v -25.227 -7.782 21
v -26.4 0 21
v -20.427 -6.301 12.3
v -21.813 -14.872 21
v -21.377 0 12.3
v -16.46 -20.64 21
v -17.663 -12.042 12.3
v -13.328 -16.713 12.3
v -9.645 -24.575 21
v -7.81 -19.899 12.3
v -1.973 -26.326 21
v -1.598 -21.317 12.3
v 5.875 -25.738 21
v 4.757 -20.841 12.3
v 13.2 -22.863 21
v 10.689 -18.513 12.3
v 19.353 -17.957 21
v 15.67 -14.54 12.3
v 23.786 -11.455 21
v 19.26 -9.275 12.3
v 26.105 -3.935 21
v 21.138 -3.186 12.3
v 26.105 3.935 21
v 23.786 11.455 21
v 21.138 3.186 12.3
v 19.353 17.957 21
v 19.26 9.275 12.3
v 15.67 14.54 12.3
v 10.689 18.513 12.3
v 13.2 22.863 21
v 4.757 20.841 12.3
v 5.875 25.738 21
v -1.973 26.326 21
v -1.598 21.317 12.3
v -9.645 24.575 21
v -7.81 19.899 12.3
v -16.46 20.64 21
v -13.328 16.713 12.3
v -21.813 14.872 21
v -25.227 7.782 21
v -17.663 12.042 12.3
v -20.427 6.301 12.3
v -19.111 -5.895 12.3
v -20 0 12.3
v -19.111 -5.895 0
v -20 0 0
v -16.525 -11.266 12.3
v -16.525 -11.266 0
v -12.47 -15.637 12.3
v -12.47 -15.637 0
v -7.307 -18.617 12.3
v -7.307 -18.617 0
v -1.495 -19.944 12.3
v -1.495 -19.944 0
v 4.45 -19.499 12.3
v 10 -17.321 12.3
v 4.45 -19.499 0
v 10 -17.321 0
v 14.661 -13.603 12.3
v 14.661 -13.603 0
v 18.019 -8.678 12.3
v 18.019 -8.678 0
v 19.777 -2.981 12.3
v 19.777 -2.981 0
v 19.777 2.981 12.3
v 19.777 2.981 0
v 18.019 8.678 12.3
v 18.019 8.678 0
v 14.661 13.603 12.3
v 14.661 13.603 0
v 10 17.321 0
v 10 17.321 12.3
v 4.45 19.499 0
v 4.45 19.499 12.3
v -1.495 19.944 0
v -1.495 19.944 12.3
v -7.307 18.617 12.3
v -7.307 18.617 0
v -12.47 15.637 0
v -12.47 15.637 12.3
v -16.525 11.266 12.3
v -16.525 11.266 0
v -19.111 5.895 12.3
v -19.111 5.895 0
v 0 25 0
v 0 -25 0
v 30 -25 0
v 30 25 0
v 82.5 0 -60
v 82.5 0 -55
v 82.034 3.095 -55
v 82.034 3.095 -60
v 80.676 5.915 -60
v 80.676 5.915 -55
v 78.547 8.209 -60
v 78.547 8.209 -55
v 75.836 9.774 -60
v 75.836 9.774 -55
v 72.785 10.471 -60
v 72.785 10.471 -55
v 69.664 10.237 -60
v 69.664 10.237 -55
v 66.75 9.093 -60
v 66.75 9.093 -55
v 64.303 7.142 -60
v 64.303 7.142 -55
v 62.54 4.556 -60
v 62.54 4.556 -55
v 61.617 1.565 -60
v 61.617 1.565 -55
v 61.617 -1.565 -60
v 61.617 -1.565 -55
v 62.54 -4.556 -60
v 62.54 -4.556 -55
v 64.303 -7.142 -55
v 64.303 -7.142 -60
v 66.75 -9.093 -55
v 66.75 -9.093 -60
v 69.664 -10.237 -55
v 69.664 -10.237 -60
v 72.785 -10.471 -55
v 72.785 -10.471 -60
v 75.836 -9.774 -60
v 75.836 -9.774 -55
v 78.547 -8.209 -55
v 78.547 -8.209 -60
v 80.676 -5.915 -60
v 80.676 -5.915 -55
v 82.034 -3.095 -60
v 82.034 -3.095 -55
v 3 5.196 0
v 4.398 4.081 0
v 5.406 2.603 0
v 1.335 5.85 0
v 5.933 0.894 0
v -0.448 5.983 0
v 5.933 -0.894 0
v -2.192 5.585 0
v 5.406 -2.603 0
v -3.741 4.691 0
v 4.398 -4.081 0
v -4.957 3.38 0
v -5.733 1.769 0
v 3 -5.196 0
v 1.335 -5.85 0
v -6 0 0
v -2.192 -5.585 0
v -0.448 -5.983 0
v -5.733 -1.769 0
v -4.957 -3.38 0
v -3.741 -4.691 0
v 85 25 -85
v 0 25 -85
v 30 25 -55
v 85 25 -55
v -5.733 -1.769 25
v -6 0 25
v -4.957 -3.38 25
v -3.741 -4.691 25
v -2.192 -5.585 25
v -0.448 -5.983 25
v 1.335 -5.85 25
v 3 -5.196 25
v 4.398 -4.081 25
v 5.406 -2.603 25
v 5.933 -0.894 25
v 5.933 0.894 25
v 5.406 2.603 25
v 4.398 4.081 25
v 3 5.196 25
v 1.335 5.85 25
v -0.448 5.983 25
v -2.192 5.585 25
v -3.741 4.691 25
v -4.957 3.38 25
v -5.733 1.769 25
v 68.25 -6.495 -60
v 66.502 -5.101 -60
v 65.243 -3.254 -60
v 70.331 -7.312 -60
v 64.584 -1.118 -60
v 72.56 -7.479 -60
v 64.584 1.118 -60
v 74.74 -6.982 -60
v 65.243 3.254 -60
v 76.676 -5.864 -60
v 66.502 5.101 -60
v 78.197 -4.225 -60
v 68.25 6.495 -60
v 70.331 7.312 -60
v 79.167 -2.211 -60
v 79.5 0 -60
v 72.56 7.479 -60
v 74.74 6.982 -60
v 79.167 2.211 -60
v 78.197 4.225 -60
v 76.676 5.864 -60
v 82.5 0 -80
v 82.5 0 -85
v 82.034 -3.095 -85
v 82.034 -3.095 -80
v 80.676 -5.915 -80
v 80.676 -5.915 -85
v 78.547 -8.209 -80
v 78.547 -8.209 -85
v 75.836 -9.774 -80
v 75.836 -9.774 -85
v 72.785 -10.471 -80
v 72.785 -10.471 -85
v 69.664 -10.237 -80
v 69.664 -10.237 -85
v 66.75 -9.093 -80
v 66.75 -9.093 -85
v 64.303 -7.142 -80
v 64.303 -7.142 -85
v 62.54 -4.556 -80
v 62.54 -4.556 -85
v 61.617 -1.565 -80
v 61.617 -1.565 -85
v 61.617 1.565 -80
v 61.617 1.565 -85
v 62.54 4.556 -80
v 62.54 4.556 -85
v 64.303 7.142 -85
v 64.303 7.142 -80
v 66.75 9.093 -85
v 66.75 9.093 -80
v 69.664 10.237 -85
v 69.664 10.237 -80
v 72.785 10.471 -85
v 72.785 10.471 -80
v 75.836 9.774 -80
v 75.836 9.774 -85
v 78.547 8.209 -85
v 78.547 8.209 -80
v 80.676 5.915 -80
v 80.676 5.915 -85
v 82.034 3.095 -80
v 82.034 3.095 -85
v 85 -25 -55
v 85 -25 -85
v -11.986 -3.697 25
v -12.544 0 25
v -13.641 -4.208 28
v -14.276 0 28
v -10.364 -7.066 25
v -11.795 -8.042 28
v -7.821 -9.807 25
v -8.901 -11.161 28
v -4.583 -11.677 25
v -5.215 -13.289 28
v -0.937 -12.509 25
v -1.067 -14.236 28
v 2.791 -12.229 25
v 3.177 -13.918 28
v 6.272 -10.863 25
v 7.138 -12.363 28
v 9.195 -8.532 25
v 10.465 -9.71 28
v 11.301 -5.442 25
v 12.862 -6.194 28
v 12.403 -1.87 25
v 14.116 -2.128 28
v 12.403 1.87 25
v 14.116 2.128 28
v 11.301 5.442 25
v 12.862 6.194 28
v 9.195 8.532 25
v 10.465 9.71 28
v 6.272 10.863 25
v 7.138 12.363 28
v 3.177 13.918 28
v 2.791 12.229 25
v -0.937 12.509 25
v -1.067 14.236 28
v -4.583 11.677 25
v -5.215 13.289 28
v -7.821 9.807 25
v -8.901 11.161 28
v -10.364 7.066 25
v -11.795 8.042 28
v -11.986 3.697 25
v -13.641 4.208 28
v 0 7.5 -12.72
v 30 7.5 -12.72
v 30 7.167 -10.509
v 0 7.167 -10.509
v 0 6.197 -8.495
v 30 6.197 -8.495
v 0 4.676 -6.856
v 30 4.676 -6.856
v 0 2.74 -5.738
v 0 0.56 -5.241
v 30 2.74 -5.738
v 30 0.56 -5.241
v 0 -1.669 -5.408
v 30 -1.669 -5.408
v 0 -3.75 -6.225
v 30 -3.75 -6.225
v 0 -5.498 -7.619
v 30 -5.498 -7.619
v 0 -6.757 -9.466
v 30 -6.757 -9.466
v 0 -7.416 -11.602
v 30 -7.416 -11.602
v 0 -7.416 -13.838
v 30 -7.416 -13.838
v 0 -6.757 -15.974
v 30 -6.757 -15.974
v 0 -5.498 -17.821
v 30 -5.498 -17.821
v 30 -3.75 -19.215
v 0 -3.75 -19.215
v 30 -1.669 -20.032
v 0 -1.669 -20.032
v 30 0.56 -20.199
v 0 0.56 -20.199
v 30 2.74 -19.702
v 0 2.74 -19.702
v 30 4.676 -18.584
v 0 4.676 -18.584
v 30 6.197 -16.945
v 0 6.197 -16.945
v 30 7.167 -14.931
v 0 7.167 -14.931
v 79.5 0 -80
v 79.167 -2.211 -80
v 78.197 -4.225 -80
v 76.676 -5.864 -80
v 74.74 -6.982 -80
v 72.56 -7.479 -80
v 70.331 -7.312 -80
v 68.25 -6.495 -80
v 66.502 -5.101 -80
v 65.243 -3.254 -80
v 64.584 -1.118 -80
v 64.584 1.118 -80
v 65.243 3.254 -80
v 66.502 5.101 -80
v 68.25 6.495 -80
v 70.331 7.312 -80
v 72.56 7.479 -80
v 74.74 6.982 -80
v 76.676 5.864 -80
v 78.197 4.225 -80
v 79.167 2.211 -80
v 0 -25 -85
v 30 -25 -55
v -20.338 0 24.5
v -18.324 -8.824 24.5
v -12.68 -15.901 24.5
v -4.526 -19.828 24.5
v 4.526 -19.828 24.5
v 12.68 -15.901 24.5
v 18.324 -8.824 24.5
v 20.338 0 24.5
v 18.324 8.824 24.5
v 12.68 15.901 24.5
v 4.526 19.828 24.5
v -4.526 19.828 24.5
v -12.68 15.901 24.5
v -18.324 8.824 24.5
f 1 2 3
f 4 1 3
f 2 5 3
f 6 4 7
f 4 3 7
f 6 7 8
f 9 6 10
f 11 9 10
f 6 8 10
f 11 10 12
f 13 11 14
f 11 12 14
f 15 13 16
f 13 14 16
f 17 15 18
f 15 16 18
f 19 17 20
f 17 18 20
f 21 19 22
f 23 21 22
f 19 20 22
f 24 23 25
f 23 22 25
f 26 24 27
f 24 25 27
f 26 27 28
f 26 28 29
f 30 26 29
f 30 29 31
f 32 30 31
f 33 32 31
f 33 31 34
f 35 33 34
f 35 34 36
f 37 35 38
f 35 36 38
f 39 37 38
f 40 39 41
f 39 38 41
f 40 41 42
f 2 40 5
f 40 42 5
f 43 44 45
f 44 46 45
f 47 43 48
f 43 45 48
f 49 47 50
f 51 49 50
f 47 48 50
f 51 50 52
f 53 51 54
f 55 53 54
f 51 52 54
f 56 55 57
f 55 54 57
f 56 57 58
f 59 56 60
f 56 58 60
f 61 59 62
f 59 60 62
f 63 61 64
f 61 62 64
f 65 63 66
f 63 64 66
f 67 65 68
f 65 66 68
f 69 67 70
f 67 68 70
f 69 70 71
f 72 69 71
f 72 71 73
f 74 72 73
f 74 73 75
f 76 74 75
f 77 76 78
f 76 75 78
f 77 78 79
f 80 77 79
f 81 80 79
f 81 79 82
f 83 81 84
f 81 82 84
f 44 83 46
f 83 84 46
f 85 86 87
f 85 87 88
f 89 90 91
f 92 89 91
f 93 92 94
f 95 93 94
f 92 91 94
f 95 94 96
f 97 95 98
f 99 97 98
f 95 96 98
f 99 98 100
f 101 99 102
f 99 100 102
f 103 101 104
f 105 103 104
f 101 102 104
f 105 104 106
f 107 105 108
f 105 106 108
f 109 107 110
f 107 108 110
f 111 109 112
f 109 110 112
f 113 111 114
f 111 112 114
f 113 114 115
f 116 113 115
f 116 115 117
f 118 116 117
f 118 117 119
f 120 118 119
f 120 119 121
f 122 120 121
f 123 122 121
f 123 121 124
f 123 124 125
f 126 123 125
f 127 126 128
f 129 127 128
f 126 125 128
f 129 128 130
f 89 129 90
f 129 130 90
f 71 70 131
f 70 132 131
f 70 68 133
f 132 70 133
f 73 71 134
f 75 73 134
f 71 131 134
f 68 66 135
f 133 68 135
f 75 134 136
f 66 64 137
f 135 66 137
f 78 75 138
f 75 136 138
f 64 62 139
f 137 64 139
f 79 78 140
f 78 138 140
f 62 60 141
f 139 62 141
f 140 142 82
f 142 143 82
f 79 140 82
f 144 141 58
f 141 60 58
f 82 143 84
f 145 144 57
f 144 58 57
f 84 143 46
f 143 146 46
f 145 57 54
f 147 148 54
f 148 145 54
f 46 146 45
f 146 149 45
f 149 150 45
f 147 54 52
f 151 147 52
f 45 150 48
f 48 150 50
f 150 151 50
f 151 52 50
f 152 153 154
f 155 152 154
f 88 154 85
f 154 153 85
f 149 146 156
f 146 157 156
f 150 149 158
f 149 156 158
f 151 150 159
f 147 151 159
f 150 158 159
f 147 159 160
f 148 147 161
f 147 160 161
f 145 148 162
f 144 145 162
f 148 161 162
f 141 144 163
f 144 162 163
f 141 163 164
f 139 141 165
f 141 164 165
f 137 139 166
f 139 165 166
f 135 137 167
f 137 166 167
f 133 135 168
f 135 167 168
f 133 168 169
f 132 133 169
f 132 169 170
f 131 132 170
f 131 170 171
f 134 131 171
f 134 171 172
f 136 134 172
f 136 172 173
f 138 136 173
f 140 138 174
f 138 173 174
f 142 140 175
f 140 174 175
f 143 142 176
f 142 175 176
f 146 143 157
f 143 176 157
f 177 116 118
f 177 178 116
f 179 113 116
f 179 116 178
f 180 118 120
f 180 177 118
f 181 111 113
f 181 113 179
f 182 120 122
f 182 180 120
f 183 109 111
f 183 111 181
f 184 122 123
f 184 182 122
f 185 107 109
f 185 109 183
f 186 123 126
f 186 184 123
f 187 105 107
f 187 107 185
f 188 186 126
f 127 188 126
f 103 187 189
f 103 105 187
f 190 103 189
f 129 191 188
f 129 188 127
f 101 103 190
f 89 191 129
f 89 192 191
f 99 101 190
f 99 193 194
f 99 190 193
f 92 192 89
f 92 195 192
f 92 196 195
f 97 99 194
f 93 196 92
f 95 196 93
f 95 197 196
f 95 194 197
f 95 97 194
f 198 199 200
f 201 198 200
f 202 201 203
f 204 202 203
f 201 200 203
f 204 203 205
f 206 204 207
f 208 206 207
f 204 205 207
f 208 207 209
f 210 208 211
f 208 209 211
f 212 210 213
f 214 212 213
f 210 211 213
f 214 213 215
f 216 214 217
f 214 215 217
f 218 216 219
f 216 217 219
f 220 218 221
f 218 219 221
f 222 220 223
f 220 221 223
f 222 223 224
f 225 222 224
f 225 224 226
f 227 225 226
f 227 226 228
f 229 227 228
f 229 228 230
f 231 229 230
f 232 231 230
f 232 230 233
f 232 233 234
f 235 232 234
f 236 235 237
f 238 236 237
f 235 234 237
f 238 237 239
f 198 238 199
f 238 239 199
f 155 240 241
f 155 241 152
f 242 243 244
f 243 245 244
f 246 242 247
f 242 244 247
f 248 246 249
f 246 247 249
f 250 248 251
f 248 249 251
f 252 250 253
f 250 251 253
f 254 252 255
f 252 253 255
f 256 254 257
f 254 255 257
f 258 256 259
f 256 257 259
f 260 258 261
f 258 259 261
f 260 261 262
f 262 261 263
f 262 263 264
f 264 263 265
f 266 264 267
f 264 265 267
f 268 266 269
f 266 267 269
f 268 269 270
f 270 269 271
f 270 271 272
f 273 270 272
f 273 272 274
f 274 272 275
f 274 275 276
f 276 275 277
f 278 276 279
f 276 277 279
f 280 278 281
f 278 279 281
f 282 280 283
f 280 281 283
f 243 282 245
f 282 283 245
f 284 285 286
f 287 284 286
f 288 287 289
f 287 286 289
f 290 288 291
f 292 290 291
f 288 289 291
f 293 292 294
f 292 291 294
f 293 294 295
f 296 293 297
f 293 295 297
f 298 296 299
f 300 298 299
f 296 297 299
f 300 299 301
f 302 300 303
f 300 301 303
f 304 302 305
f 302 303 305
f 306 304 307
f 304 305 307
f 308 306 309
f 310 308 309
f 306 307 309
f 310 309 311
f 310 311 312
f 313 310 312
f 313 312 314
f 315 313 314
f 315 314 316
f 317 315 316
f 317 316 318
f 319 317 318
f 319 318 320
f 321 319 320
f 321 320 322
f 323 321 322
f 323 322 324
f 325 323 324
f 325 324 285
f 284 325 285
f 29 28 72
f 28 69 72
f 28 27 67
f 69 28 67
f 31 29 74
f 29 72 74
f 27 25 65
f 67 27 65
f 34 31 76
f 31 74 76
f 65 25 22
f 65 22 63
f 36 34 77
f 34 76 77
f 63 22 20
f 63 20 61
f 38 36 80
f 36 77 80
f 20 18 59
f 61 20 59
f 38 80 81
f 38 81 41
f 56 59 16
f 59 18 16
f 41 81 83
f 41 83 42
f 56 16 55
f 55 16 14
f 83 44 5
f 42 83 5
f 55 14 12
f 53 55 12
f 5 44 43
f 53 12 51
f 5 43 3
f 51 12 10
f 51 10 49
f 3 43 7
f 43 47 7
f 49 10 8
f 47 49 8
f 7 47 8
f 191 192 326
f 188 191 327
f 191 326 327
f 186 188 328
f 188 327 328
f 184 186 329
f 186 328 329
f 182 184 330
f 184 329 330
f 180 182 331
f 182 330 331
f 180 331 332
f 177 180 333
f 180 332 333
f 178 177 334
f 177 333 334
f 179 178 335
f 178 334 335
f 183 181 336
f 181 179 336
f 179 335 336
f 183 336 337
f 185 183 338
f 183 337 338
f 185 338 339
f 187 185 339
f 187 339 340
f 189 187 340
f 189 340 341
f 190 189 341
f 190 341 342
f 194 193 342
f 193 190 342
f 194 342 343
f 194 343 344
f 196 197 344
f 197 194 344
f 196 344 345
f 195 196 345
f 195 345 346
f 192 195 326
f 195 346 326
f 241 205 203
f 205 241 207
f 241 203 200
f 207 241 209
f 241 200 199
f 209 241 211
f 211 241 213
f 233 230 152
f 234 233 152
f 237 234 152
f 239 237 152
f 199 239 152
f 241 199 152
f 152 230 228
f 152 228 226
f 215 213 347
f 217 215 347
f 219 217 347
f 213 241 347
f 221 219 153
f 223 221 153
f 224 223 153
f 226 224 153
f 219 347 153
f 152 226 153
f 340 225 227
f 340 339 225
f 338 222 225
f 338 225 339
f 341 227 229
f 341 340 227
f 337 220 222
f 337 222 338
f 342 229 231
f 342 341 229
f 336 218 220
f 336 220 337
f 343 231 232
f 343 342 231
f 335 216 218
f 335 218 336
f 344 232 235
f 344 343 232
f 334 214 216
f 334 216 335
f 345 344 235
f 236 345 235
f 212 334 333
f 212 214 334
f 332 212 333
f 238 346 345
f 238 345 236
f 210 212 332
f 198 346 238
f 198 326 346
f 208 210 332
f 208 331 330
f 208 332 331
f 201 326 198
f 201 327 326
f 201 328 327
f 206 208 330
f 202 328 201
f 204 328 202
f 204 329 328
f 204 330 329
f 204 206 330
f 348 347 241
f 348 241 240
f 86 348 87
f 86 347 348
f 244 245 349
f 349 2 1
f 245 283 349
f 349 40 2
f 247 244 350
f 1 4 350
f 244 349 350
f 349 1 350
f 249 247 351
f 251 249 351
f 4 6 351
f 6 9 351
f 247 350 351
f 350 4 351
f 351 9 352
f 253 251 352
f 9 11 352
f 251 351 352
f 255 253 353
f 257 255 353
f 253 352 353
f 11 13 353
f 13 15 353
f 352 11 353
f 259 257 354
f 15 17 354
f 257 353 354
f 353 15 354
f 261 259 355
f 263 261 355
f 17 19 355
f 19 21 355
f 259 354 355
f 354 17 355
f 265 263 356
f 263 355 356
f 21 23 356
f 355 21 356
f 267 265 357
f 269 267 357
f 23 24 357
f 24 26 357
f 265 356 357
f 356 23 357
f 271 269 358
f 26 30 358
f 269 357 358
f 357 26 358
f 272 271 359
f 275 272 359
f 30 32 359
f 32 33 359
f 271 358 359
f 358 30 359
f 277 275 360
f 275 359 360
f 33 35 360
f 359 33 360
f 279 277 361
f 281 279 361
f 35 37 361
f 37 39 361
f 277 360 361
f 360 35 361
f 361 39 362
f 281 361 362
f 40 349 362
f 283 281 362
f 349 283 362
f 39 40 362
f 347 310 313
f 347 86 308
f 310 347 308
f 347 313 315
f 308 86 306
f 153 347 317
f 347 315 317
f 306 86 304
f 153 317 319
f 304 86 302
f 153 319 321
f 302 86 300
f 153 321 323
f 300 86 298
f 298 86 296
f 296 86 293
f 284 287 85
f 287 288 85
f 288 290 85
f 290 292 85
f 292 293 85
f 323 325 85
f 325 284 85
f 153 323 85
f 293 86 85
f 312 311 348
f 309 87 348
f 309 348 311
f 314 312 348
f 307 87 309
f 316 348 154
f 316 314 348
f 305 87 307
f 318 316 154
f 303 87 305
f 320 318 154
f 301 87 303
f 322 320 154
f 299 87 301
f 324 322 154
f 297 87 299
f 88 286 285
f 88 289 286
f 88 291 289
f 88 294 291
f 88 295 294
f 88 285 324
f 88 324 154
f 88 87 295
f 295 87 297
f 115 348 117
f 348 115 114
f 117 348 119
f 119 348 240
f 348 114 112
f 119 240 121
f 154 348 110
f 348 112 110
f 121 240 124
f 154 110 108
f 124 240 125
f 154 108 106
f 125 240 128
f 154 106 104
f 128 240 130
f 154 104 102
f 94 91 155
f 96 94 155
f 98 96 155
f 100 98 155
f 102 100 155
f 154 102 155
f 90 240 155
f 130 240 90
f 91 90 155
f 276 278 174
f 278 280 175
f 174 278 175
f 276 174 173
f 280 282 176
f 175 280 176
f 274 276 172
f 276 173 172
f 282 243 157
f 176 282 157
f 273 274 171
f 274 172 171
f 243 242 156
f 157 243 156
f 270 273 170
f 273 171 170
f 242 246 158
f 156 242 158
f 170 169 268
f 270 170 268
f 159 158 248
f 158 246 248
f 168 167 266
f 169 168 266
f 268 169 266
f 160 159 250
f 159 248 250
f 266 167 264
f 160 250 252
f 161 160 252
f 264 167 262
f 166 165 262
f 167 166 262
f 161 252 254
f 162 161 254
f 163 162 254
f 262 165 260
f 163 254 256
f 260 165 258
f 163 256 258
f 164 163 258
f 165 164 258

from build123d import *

# Parameters (mm, degrees)
F2_W      = 50
F2_H      = 85
F3_DEPTH  = 85
F4_W      = 50
F4_H      = 55
F5_DEPTH  = 55
F6_R      = 10.5
F7_DEPTH  = 5
F8_R      = 7.5
F9_DEPTH  = 40
F10_R     = 10.5
F10_R_2   = 7.5
F11_DEPTH = 5
F12_R     = 7.5
F13_DEPTH = 56.401


with BuildPart() as f1:
    # F0 (on Front) → F1 (revolve)
    with BuildSketch(Plane.XZ):
        Polygon((-20, 0), (-6, 0), (-6, 25), (-12.543594, 25), (-14.275644, 28), (-26.4, 21), (-21.377053, 12.3), (-20, 12.3), align=None)
    revolve(axis=Axis((0, 0, 13.31774), (0, 0, 1)))


with BuildPart() as f3:
    # F2 (on Right) → F3 (new body)
    with BuildSketch(Plane.YZ):
        with Locations((0, -42.5)):
            Rectangle(F2_W, F2_H)
    extrude(amount=F3_DEPTH)

    # F4 (on face) → F5 (cut)
    with BuildSketch(Plane.YZ.offset(85)):
        with Locations((0, -27.5)):
            Rectangle(F4_W, F4_H)
    extrude(amount=-F5_DEPTH, mode=Mode.SUBTRACT)

    # F6 (on face) → F7 (cut)
    with BuildSketch(Plane(origin=(0, 0, -85), x_dir=(1, 0, 0), z_dir=(0, 0, -1))):
        with Locations((72, 0)):
            Circle(F6_R)
    extrude(amount=-F7_DEPTH, mode=Mode.SUBTRACT)

    # F8 (on face) → F9 (cut)
    with BuildSketch(Plane(origin=(0, 0, -80), x_dir=(1, 0, 0), z_dir=(0, 0, -1))):
        with Locations((72, 0)):
            Circle(F8_R)
    extrude(amount=-F9_DEPTH, mode=Mode.SUBTRACT)

    # F10 (on face) → F11 (cut)
    with BuildSketch(Plane.XY.offset(-55)):
        with Locations((72, 0)):
            Circle(F10_R)
        with Locations((72, 0)):
            Circle(F10_R_2, mode=Mode.SUBTRACT)
    extrude(amount=-F11_DEPTH, mode=Mode.SUBTRACT)

    # F12 (on face) → F13 (cut, through all)
    with BuildSketch(Plane.YZ.offset(30)):
        with Locations((0, -12.72)):
            Circle(F12_R)
    extrude(amount=-F13_DEPTH, mode=Mode.SUBTRACT)


solid = Compound([f1.part, f3.part])
